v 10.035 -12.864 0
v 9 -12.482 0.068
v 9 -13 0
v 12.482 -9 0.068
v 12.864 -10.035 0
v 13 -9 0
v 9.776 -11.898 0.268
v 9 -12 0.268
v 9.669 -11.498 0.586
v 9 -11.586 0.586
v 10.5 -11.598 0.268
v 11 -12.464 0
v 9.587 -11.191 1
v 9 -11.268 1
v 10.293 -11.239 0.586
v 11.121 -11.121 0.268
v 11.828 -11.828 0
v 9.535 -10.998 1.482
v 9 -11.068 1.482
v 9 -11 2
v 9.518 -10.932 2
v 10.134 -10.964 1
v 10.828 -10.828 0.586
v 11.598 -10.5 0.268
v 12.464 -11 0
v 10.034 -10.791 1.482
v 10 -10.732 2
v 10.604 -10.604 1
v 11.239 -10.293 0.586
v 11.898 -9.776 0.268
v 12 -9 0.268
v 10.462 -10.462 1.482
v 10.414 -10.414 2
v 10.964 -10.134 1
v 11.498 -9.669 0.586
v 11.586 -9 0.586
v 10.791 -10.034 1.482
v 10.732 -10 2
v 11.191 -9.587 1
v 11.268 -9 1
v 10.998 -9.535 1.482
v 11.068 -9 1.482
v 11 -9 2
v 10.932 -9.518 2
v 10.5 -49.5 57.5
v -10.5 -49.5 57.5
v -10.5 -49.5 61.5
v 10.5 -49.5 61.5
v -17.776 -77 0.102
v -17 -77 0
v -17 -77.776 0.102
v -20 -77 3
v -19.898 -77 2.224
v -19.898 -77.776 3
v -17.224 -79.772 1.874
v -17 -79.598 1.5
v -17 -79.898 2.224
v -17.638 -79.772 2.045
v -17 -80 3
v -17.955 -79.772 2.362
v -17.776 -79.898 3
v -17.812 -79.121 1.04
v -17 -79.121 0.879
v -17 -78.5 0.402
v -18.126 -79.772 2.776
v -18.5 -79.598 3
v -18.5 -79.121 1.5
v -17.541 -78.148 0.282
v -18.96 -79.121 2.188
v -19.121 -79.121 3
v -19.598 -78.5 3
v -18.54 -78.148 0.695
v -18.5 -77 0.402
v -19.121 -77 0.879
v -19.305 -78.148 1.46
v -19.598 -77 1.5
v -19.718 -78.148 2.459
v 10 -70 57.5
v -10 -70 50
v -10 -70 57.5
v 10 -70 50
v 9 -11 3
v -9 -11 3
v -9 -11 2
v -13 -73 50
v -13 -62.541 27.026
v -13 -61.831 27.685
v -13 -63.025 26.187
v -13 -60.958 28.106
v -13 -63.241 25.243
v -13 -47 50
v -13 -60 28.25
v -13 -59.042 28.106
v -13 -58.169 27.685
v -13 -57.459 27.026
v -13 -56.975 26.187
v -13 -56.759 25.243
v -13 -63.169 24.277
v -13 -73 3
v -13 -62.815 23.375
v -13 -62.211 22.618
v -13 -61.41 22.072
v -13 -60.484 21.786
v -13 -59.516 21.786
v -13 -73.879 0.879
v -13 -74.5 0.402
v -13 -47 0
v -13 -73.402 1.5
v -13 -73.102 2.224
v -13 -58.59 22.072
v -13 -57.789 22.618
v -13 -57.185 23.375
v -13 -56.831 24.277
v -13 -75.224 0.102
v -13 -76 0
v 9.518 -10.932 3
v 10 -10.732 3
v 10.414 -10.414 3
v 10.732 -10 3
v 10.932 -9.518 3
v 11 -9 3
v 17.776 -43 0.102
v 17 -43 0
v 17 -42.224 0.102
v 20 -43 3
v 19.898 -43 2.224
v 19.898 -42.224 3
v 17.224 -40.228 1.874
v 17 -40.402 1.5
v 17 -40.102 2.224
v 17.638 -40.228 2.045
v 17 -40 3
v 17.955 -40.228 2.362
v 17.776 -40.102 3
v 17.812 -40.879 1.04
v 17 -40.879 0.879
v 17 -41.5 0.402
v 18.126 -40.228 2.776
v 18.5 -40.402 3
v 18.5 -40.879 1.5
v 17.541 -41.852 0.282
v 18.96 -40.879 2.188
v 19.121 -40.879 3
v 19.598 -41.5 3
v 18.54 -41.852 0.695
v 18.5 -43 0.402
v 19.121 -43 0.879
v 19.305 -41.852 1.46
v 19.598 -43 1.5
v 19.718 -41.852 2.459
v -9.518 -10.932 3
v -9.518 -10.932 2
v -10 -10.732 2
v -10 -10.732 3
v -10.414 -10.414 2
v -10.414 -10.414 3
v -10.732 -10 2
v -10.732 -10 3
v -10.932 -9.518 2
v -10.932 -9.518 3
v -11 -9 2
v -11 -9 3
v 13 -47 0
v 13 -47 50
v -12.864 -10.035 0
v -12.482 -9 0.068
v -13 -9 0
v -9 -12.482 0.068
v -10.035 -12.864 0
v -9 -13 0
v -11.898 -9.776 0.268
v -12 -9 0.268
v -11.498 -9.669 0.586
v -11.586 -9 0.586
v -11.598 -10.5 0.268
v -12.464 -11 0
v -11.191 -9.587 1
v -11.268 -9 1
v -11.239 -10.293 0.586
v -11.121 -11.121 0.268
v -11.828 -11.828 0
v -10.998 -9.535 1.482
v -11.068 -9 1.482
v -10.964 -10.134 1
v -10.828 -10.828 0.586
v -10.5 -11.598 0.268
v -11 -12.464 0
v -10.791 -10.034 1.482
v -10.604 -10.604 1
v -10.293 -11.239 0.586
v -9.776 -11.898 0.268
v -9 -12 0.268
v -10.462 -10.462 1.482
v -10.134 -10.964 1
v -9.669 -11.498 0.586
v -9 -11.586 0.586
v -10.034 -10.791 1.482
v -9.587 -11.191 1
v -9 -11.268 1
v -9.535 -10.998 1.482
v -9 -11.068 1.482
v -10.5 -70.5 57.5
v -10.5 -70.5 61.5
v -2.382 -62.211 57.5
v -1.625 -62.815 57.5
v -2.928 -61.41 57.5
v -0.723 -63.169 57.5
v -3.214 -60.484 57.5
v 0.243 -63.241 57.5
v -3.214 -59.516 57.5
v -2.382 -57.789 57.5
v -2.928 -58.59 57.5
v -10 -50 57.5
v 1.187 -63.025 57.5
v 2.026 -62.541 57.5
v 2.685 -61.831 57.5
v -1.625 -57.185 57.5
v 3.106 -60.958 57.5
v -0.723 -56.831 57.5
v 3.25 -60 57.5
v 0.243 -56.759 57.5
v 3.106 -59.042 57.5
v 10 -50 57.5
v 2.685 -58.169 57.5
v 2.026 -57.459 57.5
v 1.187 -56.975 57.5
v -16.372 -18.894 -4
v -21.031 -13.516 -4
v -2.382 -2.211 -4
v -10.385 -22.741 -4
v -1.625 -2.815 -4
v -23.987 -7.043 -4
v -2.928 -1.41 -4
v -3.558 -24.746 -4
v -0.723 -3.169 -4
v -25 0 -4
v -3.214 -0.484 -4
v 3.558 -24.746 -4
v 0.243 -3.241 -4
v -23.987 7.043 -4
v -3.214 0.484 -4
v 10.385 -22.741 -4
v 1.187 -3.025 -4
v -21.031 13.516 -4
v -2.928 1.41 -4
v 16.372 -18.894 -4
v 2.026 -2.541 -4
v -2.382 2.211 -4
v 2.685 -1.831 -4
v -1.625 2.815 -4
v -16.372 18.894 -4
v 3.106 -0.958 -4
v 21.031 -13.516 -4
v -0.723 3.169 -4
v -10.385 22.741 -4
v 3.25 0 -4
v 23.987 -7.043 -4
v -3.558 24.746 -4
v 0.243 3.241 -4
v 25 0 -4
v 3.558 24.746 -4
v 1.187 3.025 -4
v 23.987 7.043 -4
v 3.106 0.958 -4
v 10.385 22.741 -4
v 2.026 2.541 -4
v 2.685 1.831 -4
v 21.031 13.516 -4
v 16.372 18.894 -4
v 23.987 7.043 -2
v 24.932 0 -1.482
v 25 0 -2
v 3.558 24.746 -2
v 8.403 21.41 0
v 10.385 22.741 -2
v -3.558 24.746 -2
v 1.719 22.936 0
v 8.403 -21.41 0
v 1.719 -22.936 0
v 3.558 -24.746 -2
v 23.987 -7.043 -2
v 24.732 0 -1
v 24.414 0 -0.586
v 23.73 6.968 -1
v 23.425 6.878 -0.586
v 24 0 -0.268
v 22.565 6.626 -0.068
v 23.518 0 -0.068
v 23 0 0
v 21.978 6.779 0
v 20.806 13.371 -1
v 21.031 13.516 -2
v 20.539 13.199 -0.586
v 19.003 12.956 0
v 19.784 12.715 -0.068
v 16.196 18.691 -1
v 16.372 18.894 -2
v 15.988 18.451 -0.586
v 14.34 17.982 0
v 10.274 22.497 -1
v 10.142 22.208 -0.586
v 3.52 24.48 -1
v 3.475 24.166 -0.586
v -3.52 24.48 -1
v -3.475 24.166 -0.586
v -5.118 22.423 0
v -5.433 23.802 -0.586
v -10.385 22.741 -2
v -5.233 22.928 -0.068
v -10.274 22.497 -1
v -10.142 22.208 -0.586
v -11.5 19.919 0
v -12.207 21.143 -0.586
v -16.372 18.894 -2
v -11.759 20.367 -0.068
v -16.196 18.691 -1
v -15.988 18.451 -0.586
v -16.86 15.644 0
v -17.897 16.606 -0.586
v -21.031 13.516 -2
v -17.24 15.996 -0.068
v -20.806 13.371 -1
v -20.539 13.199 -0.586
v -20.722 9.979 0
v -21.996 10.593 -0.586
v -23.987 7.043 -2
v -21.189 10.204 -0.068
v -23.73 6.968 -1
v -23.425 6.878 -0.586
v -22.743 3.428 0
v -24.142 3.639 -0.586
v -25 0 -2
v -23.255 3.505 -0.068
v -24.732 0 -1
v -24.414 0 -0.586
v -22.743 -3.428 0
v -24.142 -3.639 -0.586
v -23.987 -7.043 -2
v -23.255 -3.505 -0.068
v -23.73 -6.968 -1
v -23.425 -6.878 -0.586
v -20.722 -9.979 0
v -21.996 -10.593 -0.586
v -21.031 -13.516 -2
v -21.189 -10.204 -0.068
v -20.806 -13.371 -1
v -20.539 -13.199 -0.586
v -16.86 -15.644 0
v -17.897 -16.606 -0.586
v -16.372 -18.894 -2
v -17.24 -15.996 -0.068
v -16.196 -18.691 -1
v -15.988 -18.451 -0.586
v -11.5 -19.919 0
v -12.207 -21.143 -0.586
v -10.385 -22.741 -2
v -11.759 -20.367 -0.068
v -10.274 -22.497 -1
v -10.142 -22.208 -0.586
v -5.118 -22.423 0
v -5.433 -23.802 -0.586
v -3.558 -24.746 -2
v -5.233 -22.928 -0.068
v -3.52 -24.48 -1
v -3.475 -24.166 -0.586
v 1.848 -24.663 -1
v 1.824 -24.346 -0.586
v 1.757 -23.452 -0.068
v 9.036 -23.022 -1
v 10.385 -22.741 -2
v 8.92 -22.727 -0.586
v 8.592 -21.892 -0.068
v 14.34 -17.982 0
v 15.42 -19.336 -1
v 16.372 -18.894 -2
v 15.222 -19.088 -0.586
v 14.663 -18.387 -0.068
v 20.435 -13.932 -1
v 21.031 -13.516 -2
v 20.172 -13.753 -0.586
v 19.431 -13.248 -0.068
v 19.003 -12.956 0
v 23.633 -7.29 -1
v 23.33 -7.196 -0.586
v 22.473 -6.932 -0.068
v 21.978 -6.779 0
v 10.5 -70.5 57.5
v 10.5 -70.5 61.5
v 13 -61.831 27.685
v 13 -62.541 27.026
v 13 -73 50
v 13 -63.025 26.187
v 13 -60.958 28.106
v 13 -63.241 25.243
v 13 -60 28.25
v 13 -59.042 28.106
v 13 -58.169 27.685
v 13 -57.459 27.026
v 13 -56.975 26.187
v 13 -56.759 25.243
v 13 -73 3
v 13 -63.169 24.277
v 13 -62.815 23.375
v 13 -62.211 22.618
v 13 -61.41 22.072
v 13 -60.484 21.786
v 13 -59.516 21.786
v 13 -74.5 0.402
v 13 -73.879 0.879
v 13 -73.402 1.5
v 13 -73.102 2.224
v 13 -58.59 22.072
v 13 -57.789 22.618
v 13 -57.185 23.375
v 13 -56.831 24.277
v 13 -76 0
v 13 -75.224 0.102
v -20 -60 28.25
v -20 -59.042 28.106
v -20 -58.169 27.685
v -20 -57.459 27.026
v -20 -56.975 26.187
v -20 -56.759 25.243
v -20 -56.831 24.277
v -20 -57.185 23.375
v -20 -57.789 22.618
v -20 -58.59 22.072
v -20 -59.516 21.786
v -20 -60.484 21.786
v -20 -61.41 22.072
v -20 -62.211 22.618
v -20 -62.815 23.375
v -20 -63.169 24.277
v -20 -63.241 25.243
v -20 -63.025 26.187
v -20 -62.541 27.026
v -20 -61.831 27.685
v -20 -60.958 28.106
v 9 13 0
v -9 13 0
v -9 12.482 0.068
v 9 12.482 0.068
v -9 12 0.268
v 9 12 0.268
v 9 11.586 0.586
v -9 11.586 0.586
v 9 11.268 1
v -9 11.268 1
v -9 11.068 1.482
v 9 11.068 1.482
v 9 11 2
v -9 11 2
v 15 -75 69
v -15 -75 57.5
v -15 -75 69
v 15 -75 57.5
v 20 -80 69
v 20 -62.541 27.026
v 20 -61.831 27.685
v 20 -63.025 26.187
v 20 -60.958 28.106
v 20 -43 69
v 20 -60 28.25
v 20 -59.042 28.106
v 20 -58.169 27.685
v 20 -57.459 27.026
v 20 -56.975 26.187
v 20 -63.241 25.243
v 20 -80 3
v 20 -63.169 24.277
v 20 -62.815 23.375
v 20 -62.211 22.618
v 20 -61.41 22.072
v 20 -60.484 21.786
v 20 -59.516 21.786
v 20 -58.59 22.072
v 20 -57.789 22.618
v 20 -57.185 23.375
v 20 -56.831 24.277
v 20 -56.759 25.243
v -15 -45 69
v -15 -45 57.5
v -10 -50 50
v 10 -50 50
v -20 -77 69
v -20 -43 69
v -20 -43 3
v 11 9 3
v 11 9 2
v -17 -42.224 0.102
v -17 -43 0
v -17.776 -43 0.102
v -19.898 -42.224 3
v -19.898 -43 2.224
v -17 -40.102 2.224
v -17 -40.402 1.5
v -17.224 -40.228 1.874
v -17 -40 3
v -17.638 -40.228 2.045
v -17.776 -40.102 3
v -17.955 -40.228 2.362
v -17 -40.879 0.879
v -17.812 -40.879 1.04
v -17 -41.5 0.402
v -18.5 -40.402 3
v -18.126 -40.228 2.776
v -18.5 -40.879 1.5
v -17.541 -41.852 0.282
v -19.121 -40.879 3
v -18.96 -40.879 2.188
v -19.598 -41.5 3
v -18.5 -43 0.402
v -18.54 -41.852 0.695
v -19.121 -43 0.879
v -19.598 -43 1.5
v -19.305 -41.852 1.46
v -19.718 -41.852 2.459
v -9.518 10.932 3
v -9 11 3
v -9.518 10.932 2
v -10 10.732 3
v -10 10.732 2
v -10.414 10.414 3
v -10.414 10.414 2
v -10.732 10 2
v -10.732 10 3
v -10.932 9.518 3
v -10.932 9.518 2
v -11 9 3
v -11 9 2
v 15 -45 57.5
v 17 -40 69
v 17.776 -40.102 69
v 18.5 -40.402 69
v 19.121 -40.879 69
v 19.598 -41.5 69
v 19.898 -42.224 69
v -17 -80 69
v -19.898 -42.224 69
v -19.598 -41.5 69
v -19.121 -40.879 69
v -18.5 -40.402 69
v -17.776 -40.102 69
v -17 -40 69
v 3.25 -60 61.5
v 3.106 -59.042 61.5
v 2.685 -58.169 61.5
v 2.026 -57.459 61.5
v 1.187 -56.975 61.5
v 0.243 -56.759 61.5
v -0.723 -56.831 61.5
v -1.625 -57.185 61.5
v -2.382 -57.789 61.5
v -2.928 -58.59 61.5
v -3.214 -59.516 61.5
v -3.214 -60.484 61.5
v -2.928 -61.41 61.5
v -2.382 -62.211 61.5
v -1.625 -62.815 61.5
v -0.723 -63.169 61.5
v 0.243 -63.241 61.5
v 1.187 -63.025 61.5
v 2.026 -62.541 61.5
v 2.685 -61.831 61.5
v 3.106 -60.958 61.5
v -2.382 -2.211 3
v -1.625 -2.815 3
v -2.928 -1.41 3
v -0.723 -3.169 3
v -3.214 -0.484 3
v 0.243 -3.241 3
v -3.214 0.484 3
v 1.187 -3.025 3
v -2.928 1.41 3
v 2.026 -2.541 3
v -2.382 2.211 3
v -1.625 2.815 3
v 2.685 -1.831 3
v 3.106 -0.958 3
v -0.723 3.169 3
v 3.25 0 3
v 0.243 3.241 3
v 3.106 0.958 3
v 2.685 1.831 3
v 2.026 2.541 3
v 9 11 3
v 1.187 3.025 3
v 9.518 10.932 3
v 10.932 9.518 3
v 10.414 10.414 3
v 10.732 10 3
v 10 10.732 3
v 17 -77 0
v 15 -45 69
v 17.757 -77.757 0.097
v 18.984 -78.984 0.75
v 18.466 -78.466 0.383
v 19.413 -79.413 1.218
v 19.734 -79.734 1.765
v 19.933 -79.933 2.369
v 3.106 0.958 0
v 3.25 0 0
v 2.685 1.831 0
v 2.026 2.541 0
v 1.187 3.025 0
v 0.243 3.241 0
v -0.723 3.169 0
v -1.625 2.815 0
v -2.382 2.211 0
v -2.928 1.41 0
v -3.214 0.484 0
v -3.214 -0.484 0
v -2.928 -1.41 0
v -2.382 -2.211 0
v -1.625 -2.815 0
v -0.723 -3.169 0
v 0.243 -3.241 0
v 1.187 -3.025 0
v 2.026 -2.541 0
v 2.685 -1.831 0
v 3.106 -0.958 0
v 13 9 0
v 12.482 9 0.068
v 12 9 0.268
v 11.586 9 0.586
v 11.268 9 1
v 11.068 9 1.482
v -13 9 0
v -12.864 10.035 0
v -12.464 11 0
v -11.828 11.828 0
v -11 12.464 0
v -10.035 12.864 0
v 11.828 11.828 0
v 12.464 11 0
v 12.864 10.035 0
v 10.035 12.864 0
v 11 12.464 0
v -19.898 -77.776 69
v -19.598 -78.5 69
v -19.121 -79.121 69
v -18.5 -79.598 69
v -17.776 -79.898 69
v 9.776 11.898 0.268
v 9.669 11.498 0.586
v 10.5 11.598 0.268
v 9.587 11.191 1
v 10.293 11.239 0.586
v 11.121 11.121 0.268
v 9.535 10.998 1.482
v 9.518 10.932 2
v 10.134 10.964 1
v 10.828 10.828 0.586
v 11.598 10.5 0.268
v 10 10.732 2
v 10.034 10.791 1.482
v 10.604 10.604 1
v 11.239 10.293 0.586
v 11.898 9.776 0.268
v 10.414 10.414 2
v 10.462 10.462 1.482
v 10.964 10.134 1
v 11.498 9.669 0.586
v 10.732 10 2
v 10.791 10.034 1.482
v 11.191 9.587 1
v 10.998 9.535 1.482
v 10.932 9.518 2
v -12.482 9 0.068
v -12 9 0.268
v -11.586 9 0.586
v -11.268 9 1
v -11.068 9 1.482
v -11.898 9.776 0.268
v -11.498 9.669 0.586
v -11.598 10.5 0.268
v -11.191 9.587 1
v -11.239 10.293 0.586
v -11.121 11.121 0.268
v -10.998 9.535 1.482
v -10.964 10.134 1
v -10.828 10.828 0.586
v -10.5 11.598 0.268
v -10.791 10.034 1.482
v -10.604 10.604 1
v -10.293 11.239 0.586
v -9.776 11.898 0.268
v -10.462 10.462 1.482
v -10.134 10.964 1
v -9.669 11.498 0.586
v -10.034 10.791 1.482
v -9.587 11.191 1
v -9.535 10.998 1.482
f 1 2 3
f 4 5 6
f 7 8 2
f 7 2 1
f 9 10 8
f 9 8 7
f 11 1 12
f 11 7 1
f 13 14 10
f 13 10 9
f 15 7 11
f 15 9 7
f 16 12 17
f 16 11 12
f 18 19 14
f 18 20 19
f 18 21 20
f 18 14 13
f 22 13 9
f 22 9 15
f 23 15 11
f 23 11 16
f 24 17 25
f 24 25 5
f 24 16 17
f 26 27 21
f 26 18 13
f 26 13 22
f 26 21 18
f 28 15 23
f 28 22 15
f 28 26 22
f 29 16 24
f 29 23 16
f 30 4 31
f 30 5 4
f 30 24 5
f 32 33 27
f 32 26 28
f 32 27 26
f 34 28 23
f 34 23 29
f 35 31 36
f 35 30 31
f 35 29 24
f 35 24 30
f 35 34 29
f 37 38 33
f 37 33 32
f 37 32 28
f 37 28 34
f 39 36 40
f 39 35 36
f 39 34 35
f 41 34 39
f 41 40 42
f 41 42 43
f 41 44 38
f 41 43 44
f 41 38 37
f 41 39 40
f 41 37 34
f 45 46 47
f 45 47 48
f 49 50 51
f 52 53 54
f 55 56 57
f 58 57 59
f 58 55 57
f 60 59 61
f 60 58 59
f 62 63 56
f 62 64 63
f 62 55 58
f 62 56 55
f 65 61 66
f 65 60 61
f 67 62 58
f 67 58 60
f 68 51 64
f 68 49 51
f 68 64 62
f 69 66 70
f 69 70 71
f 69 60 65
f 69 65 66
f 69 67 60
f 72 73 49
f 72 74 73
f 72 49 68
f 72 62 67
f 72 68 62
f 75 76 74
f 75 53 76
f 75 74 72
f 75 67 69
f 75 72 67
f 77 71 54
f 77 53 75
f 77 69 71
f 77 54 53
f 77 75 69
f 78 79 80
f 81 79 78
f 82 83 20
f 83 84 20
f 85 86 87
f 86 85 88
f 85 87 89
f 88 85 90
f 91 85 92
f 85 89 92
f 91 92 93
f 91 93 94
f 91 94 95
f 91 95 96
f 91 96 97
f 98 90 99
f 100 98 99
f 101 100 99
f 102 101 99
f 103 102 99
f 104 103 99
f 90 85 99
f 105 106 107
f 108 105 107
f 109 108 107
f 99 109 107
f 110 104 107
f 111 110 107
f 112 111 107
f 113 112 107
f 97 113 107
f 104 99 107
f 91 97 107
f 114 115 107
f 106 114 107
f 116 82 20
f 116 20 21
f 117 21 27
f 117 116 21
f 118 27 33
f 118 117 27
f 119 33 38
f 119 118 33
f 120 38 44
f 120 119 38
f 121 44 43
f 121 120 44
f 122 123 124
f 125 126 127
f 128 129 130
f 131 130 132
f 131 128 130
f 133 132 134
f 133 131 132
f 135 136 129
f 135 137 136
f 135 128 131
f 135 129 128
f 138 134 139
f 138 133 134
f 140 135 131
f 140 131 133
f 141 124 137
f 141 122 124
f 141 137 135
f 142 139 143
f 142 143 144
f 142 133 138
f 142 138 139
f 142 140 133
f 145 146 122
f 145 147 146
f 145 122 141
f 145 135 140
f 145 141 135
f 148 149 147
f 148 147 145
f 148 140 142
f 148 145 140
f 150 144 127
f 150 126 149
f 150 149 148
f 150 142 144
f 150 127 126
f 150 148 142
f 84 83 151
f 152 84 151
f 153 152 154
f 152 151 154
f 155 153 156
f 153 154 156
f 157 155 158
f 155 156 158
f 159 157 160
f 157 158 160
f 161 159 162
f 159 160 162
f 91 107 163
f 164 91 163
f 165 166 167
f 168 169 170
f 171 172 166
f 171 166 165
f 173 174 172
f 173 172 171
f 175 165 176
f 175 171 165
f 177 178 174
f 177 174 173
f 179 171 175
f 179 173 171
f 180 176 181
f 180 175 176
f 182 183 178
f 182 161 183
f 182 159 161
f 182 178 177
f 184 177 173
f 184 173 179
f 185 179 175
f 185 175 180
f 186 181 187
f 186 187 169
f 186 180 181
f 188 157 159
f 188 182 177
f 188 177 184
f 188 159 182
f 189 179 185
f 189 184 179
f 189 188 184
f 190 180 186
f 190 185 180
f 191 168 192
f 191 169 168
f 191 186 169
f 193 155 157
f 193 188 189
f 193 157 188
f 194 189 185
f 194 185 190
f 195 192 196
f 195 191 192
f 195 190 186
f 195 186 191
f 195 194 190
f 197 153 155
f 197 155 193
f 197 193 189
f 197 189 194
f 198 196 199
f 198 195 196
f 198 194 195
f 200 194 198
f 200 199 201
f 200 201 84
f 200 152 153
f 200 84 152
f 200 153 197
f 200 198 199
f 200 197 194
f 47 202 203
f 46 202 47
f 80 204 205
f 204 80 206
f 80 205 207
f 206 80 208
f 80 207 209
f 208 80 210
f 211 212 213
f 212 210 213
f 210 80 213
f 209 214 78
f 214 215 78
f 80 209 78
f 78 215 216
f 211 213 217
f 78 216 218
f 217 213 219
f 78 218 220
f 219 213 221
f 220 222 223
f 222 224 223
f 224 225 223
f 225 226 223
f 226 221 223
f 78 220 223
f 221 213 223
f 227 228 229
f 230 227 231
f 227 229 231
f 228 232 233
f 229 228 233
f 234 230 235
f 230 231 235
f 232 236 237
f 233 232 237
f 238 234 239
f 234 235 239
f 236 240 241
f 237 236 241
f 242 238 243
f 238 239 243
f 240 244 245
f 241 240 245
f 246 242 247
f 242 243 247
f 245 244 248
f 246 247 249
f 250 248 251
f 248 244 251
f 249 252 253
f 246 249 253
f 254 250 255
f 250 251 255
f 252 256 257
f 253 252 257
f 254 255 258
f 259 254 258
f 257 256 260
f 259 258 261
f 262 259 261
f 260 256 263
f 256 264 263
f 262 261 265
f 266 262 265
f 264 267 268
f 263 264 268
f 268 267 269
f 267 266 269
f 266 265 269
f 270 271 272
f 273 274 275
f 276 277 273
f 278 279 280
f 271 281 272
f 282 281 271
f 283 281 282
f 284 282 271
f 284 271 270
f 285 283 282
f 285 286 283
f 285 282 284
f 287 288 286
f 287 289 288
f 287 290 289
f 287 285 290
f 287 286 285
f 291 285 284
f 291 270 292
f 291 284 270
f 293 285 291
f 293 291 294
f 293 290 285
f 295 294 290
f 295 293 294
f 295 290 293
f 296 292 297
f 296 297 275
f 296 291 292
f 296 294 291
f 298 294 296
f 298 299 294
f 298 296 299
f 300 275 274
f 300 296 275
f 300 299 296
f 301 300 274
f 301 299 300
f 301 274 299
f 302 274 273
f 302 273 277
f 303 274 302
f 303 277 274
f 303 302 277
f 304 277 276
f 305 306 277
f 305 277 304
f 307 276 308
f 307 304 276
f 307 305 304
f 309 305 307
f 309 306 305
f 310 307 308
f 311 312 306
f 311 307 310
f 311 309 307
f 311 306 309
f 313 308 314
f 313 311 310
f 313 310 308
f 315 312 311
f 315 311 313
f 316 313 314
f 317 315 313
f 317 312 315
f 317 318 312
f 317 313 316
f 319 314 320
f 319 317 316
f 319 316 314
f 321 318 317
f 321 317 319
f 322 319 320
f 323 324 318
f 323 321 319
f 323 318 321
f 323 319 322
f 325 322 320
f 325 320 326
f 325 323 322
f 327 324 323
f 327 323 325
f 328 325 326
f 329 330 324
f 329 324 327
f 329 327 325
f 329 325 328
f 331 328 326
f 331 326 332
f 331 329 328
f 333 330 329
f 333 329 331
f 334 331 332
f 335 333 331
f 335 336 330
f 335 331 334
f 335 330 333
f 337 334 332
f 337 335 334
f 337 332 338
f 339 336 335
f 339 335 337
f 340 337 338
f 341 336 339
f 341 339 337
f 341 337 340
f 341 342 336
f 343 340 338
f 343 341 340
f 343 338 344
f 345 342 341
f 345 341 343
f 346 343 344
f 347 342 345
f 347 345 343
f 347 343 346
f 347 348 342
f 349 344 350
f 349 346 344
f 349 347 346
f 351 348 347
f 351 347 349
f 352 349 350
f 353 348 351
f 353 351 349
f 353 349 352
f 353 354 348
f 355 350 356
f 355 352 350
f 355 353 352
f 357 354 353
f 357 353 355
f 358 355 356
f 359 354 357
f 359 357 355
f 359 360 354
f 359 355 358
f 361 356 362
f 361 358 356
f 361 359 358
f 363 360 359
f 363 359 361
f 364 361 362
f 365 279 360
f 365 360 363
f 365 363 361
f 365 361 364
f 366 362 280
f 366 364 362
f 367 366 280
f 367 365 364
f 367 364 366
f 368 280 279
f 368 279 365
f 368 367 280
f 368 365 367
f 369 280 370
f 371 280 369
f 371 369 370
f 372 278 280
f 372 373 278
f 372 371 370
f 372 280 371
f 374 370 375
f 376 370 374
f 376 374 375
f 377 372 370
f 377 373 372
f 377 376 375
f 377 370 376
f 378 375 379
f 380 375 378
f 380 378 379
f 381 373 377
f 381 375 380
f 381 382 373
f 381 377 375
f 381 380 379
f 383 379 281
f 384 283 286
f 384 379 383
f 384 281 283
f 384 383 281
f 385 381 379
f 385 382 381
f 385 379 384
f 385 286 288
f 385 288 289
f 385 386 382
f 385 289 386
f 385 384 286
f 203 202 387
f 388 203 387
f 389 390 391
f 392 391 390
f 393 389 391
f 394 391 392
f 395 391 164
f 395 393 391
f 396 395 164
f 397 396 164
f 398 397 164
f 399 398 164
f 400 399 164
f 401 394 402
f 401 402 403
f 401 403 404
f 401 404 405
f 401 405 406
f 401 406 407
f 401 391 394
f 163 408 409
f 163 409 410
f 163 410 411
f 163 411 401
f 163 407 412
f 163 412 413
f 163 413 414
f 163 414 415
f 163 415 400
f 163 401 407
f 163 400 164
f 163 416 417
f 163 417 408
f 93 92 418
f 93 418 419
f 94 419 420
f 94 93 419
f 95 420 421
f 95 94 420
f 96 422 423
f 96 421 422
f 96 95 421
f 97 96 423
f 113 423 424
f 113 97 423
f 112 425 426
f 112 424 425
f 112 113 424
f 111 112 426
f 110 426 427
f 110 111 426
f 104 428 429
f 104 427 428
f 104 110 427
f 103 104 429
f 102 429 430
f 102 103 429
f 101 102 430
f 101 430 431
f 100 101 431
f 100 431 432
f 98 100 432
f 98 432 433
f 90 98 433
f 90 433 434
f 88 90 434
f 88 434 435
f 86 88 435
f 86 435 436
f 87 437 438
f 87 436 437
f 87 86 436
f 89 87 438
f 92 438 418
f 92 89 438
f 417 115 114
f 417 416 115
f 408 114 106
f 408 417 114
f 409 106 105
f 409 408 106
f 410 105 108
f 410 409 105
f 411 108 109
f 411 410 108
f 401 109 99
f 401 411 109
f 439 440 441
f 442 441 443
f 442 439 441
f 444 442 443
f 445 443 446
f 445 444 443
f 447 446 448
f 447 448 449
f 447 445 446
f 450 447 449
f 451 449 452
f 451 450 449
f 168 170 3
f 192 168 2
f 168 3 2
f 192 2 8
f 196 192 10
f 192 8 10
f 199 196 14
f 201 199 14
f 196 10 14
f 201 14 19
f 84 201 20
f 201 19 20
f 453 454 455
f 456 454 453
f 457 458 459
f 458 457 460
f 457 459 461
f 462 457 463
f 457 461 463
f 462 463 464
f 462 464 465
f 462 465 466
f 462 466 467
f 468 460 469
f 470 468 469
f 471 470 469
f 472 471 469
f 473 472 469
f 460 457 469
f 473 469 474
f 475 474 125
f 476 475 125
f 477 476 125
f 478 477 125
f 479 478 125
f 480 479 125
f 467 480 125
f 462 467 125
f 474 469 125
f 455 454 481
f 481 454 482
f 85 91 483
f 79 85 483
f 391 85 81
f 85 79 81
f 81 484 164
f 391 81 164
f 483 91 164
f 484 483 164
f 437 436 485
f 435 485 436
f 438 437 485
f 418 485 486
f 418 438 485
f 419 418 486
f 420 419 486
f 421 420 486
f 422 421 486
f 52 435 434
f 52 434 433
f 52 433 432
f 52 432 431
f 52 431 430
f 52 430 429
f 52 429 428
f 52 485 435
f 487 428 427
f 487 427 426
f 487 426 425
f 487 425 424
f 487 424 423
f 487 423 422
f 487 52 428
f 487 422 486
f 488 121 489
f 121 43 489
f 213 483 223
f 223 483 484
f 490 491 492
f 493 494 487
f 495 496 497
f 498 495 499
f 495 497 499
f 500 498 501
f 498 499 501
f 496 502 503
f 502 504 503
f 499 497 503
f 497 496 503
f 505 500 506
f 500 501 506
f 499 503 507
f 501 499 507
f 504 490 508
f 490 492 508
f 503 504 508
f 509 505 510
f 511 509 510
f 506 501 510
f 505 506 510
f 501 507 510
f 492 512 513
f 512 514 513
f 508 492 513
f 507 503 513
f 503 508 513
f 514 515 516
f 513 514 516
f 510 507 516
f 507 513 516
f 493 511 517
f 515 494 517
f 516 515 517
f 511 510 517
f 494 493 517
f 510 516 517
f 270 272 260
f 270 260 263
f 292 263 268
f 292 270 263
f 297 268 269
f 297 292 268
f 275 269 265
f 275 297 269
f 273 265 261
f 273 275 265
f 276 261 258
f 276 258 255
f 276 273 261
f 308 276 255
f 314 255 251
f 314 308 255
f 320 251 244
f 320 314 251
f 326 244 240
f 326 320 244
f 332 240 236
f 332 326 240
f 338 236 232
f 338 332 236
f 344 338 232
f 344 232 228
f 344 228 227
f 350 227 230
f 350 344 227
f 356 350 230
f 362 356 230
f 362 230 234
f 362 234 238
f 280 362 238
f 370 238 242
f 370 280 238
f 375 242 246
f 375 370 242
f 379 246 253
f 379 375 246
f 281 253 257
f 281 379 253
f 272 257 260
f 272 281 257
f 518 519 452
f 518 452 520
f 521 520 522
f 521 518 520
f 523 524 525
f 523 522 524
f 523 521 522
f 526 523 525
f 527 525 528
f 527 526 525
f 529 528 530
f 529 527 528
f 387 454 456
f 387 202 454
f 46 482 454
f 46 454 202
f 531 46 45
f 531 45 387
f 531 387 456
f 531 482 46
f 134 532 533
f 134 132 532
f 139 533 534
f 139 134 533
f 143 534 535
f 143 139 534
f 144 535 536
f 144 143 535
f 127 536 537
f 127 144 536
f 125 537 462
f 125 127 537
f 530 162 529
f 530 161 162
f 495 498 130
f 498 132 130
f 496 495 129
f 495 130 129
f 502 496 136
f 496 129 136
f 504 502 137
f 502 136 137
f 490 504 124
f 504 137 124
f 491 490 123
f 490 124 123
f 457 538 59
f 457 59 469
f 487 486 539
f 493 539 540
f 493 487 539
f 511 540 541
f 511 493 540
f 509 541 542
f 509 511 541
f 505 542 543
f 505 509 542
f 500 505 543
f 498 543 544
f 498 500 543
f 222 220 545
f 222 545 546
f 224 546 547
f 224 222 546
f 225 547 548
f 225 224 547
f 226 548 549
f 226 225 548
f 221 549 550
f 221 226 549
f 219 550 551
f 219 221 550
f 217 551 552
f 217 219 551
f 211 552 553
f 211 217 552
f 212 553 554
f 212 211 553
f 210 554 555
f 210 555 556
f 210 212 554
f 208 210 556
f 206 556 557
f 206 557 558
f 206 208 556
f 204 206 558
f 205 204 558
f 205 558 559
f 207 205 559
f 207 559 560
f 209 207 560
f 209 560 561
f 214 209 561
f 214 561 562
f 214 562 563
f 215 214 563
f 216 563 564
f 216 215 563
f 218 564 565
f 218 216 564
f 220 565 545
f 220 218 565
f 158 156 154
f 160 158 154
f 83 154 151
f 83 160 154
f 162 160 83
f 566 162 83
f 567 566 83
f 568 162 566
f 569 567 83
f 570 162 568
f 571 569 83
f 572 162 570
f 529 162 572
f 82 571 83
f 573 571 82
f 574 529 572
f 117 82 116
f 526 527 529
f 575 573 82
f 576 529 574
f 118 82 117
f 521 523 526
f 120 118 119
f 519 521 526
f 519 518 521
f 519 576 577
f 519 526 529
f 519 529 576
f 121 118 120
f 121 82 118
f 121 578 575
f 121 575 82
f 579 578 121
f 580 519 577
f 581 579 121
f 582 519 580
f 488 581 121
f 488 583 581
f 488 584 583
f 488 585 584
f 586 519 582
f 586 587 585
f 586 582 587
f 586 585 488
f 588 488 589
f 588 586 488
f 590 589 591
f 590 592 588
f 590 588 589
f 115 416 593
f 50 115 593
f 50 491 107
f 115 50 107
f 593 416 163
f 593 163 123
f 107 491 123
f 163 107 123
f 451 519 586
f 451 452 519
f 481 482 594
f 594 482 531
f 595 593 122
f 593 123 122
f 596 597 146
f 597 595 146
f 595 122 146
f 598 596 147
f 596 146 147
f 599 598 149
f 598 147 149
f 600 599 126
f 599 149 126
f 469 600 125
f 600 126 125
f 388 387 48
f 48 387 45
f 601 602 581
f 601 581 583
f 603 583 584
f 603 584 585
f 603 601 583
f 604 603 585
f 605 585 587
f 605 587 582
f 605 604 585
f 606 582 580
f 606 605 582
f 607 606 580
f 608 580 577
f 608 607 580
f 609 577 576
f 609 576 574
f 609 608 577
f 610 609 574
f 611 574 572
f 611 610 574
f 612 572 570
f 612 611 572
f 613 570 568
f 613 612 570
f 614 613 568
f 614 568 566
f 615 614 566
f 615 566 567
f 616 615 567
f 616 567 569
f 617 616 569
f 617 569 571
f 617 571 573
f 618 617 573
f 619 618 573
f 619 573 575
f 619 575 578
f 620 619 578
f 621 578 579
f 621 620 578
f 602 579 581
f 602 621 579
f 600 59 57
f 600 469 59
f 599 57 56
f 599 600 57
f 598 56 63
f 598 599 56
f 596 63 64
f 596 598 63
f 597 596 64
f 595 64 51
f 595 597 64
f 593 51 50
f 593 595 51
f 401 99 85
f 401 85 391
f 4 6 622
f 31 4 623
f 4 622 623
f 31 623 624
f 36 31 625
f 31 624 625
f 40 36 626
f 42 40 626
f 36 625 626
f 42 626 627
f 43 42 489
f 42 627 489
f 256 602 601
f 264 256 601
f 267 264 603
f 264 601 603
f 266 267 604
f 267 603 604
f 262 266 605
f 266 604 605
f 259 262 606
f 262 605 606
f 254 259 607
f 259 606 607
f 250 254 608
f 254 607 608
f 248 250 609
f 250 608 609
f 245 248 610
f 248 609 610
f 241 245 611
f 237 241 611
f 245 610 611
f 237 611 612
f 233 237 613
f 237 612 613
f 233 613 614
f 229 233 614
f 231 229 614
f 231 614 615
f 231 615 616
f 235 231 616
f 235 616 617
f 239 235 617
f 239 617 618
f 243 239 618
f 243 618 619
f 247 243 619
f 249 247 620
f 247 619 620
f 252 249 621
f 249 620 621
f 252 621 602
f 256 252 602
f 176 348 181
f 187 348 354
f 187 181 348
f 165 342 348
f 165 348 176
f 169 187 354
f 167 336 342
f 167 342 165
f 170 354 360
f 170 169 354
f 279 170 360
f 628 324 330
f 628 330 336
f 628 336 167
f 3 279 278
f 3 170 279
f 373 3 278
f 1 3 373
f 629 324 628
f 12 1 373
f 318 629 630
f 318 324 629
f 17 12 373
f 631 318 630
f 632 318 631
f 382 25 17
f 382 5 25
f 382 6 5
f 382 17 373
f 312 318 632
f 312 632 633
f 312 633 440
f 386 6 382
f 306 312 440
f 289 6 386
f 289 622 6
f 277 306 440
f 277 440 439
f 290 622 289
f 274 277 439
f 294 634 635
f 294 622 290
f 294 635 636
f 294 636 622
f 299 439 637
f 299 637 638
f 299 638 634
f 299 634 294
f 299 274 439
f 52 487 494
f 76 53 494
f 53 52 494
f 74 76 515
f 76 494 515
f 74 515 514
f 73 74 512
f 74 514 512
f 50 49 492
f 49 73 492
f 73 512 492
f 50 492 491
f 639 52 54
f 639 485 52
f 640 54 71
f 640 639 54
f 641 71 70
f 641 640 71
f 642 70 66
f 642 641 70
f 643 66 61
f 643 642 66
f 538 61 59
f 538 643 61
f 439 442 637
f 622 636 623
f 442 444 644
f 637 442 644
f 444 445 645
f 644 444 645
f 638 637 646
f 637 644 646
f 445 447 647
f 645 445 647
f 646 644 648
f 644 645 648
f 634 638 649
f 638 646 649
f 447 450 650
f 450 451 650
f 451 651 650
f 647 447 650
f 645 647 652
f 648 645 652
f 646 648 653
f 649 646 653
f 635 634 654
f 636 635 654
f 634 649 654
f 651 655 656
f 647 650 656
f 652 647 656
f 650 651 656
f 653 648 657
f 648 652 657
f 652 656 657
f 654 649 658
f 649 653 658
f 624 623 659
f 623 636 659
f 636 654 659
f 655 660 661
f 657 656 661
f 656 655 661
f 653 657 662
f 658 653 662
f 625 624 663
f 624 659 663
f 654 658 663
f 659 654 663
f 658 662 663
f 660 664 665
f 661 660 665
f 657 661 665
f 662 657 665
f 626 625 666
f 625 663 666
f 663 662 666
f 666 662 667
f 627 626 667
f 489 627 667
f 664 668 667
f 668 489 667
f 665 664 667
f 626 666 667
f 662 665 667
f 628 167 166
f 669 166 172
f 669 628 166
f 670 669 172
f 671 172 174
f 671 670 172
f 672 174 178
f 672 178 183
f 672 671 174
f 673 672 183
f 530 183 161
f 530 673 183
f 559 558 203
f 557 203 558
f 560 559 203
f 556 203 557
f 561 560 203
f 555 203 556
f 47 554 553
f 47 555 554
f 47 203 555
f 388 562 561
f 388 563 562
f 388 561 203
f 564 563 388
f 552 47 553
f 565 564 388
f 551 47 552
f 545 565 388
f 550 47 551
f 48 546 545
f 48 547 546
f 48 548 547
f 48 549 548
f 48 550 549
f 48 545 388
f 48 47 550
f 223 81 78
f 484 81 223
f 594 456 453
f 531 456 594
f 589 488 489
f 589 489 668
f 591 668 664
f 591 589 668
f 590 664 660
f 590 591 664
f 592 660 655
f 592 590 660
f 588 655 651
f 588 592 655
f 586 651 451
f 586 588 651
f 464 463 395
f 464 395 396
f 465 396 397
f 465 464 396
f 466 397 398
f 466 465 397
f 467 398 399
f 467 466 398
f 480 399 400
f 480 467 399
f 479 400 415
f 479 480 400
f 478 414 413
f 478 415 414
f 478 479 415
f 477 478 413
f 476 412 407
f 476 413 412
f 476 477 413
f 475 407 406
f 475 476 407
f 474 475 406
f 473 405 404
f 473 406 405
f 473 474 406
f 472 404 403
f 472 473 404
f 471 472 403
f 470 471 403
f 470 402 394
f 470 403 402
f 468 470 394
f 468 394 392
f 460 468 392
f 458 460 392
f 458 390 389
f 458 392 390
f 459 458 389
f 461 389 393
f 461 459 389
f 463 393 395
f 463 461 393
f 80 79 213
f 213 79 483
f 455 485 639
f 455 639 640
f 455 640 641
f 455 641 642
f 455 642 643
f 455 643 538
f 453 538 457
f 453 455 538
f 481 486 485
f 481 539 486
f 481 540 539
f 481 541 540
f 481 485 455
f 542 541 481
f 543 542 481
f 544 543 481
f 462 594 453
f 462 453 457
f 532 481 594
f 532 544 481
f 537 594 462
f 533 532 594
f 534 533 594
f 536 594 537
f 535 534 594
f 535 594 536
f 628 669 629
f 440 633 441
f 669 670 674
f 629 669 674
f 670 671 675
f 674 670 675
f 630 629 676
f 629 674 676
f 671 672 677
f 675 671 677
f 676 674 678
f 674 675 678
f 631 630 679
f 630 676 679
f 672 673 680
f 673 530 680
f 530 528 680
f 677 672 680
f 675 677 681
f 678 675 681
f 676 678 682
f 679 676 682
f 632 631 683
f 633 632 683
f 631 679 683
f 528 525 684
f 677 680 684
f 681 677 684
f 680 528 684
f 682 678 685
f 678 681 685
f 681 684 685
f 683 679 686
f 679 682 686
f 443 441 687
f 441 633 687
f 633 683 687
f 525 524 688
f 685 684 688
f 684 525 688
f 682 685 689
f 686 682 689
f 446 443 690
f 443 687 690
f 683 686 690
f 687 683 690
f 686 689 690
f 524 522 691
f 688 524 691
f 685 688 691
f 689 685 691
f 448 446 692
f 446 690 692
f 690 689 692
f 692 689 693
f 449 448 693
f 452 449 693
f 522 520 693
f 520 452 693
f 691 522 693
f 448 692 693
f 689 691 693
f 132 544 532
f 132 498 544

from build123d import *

# Parameters (mm, degrees)
SKETCH001_R      = 25
SKETCH001_R_2    = 3.25
EXTRUDE001_DEPTH = 4
SKETCH_W         = 22
SKETCH_H         = 22
SKETCH_R         = 3.25
EXTRUDE_DEPTH    = 3
FILLET_R         = 2
CYLINDER_R       = 3.25
CYLINDER_DEPTH   = 60
SKETCH003_W      = 40
SKETCH003_H      = 40
SKETCH003_W_2    = 26
SKETCH003_H_2    = 26
EXTRUDE003_DEPTH = 50
SKETCH004_W      = 40
SKETCH004_H      = 40
SKETCH004_W_2    = 20
SKETCH004_H_2    = 20
EXTRUDE004_DEPTH = 7.5
SKETCH006_W      = 40
SKETCH006_H      = 40
SKETCH006_W_2    = 30
SKETCH006_H_2    = 30
EXTRUDE005_DEPTH = 11.5
SKETCH002_W      = 21
SKETCH002_H      = 21
SKETCH002_R      = 3.25
EXTRUDE002_DEPTH = 4
FILLET001_R      = 3


with BuildPart() as diskmount:
    # Sketch001 → Extrude001 (new body)
    with BuildSketch(Plane.XY):
        Circle(SKETCH001_R)
        Circle(SKETCH001_R_2, mode=Mode.SUBTRACT)
    extrude(amount=-EXTRUDE001_DEPTH)


with BuildPart() as panelbasemount_fillet:
    # Sketch → Extrude (new body)
    with BuildSketch(Plane.XY):
        Rectangle(SKETCH_W, SKETCH_H)
        Circle(SKETCH_R, mode=Mode.SUBTRACT)
    extrude(amount=EXTRUDE_DEPTH)

    # Fusion: union diskMount
    add(diskmount.part)

    # Fillet
    fillet_edges = [panelbasemount_fillet.edges().sort_by_distance(p)[0] for p in [
        (-11, 11, 1.5),
        (-11, -11, 1.5),
        (-11, 0, 0),
        (11, 11, 1.5),
        (0, 11, 0),
        (11, -11, 1.5),
        (0, -11, 0),
        (-25, 0, 0),
        (11, 0, 0),
    ]]
    fillet(fillet_edges, radius=FILLET_R)


with BuildPart() as cylinder:
    # Cylinder → Cylinder (new body)
    with BuildSketch(Plane(origin=(25, -60, 25), x_dir=(0, 0, 1), z_dir=(-1, 0, 0))):
        Circle(CYLINDER_R)
    extrude(amount=CYLINDER_DEPTH)


with BuildPart() as tslotmount:
    # Sketch003 → Extrude003 (new body)
    with BuildSketch(Plane(origin=(0, -60, 0), x_dir=(1, 0, 0), z_dir=(0, 0, 1))):
        Rectangle(SKETCH003_W, SKETCH003_H)
        Rectangle(SKETCH003_W_2, SKETCH003_H_2, mode=Mode.SUBTRACT)
    extrude(amount=EXTRUDE003_DEPTH)


with BuildPart() as separator:
    # Sketch004 → Extrude004 (new body)
    with BuildSketch(Plane.XY.offset(50)):
        Rectangle(SKETCH004_W, SKETCH004_H)
        Rectangle(SKETCH004_W_2, SKETCH004_H_2, mode=Mode.SUBTRACT)
    extrude(amount=EXTRUDE004_DEPTH)


with BuildPart() as separator_1:
    # Extrude004 placement: moved
    add(separator.part.moved(Location((0, -60, 0))))


with BuildPart() as rotatebasemount:
    # Sketch006 → Extrude005 (new body)
    with BuildSketch(Plane(origin=(0, -60, 57.5), x_dir=(1, 0, 0), z_dir=(0, 0, 1))):
        Rectangle(SKETCH006_W, SKETCH006_H)
        Rectangle(SKETCH006_W_2, SKETCH006_H_2, mode=Mode.SUBTRACT)
    extrude(amount=EXTRUDE005_DEPTH)


with BuildPart() as tslotmount001:
    # Sketch002 → Extrude002 (new body)
    with BuildSketch(Plane(origin=(0, -60, 57.5), x_dir=(1, 0, 0), z_dir=(0, 0, 1))):
        Rectangle(SKETCH002_W, SKETCH002_H)
        Circle(SKETCH002_R, mode=Mode.SUBTRACT)
    extrude(amount=EXTRUDE002_DEPTH)

    # Fusion001: union tSlotMount, separator, rotateBaseMount
    add(tslotmount.part)
    add(separator_1.part)
    add(rotatebasemount.part)

    # Cut: cut Cylinder
    add(cylinder.part, mode=Mode.SUBTRACT)

    # Fillet001
    fillet001_edges = [tslotmount001.edges().sort_by_distance(p)[0] for p in [
        (-20, -60, 0),
        (0, -80, 0),
        (20, -60, 0),
        (0, -40, 0),
        (-20, -40, 34.5),
        (-20, -80, 34.5),
        (0, -73, 0),
        (20, -40, 34.5),
    ]]
    fillet(fillet001_edges, radius=FILLET001_R)


solid = Compound([panelbasemount_fillet.part, tslotmount001.part])
